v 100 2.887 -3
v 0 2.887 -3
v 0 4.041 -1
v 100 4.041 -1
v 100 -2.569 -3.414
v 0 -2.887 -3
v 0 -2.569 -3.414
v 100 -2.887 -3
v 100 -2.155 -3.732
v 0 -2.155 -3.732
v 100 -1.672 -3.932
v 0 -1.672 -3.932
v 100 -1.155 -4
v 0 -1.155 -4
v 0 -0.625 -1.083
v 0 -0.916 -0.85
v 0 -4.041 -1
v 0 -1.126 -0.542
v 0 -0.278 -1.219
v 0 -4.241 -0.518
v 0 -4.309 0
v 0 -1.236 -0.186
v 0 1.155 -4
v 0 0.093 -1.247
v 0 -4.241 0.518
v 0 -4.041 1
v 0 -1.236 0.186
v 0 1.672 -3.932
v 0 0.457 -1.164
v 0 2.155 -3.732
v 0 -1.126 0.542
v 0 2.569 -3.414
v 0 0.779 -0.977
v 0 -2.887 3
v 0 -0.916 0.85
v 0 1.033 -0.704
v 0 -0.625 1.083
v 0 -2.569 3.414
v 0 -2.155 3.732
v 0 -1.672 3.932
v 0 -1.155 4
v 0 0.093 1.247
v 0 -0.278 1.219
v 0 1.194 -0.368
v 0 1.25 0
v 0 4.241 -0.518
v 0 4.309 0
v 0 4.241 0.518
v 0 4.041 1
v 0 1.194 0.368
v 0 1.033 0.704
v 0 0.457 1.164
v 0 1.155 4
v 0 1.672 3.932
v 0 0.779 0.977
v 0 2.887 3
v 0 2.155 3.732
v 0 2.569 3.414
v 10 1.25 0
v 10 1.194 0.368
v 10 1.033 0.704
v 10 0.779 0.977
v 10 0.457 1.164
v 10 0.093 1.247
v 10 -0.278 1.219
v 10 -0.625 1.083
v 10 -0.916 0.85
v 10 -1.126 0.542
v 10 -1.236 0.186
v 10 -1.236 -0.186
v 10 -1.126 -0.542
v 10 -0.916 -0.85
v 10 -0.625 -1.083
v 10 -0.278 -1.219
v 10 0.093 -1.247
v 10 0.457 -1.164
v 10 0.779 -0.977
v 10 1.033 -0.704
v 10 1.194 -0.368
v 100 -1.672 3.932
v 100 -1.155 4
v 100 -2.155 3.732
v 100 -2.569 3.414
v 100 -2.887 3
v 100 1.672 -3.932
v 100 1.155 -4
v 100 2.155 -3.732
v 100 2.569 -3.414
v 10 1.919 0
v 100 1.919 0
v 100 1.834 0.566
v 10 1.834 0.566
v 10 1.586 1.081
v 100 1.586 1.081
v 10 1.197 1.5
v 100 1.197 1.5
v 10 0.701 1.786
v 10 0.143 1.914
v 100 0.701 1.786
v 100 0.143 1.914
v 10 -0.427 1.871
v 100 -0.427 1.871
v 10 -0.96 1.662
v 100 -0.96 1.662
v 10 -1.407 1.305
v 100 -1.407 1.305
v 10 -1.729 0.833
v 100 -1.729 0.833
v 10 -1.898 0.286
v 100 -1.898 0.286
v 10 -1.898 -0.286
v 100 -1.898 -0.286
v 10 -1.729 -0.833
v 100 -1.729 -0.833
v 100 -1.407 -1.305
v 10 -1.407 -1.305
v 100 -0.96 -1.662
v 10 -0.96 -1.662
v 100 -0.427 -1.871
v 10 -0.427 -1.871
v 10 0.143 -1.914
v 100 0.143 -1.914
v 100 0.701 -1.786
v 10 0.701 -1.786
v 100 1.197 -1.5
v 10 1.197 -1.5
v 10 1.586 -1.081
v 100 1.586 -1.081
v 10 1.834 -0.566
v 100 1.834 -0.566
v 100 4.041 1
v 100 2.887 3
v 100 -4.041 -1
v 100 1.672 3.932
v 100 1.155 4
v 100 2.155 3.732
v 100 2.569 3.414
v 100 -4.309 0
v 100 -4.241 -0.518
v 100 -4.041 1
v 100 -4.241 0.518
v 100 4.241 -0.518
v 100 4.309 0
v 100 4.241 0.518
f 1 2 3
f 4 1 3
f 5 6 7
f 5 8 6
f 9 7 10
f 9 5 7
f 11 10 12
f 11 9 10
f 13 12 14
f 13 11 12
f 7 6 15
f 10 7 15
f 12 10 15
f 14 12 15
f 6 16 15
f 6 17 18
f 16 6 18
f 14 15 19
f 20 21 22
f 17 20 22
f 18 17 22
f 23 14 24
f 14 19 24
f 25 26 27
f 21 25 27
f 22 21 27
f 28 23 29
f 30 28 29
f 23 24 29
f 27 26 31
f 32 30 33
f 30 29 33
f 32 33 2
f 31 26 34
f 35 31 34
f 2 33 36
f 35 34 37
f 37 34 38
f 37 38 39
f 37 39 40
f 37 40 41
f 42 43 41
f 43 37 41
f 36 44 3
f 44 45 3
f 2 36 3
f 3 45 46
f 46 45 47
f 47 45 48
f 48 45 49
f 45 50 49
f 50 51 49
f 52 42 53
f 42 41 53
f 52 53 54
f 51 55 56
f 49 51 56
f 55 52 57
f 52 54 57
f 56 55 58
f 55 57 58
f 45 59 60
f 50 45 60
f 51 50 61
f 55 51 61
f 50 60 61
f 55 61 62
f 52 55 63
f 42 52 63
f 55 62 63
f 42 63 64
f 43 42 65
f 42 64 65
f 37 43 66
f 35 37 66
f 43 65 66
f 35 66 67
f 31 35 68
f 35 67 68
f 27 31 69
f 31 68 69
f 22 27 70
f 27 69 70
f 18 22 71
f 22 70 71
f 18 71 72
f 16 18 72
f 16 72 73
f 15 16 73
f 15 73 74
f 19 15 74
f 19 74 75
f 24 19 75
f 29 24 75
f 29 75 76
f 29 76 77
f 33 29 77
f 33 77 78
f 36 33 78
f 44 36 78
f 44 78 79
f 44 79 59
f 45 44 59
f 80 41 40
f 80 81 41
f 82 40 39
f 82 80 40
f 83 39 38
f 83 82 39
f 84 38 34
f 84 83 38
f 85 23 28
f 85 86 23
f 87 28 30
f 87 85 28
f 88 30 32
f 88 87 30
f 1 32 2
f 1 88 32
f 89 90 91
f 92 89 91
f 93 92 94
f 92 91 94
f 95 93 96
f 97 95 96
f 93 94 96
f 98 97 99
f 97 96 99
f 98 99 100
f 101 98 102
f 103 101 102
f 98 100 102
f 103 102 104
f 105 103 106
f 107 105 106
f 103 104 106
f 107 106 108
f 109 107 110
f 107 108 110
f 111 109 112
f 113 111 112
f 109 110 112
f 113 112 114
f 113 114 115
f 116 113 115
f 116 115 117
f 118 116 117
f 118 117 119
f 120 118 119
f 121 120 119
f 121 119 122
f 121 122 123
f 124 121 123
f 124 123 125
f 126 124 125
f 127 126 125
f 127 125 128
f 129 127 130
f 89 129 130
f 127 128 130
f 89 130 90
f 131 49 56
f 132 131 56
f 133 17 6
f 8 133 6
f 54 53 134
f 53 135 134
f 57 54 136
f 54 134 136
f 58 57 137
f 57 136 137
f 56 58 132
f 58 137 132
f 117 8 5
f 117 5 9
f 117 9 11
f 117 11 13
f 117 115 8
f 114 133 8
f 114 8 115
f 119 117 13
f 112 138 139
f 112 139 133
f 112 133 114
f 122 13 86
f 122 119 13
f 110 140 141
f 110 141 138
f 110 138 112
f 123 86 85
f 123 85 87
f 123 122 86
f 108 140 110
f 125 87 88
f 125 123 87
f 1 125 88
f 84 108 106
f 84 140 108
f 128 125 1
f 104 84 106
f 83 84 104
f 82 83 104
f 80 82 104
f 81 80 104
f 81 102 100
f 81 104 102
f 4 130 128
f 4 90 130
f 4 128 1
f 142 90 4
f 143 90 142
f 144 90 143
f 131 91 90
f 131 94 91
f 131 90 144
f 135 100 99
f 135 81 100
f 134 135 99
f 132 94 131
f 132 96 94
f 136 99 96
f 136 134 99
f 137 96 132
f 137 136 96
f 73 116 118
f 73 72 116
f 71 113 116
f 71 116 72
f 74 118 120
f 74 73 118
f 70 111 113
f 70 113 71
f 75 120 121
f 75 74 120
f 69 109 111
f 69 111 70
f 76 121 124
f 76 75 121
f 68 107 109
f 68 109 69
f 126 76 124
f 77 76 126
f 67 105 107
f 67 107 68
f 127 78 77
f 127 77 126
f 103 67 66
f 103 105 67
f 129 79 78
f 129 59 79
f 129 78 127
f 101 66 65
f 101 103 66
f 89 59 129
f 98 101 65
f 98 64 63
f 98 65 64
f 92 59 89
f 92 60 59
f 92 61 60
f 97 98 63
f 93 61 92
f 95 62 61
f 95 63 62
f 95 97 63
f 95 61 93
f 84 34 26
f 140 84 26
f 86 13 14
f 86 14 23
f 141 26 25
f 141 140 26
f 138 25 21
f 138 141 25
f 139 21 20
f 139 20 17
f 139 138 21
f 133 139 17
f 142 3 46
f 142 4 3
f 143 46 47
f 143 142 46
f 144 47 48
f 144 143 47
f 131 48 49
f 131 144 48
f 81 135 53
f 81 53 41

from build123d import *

# Parameters (mm, degrees)
F1_DEPTH = 100
F2_R     = 2
F3_R     = 1.9191209756
F4_DEPTH = 90
F5_R     = 1.25
F6_DEPTH = 20


# Not quite as in the source:
# - a feature names something its author has since deleted; it is built from what else it names


with BuildPart() as f1:
    # F0 (on Right) → F1 (new body)
    with BuildSketch(Plane.YZ):
        Polygon((2.3094010768, 4), (-2.3094010768, 4), (-4.6188021535, 0), (-2.3094010768, -4), (2.3094010768, -4), (4.6188021535, 0), align=None)
    extrude(amount=F1_DEPTH)

    # F2
    f2_edges = [f1.edges().sort_by_distance(p)[0] for p in [
        (50, -2.309401, 4),
        (50, -4.618802, 0),
        (50, -2.309401, -4),
        (50, 2.309401, 4),
        (50, 4.618802, 0),
        (50, 2.309401, -4),
    ]]
    fillet(f2_edges, radius=F2_R)

    # F3 (on face) → F4 (cut)
    with BuildSketch(Plane.YZ.offset(100)):
        Circle(F3_R)
    extrude(amount=-F4_DEPTH, mode=Mode.SUBTRACT)

    # F5 (on face) → F6 (cut)
    with BuildSketch(Plane.YZ.offset(10)):
        Circle(F5_R)
    extrude(amount=-F6_DEPTH, mode=Mode.SUBTRACT)


solid = f1.part
